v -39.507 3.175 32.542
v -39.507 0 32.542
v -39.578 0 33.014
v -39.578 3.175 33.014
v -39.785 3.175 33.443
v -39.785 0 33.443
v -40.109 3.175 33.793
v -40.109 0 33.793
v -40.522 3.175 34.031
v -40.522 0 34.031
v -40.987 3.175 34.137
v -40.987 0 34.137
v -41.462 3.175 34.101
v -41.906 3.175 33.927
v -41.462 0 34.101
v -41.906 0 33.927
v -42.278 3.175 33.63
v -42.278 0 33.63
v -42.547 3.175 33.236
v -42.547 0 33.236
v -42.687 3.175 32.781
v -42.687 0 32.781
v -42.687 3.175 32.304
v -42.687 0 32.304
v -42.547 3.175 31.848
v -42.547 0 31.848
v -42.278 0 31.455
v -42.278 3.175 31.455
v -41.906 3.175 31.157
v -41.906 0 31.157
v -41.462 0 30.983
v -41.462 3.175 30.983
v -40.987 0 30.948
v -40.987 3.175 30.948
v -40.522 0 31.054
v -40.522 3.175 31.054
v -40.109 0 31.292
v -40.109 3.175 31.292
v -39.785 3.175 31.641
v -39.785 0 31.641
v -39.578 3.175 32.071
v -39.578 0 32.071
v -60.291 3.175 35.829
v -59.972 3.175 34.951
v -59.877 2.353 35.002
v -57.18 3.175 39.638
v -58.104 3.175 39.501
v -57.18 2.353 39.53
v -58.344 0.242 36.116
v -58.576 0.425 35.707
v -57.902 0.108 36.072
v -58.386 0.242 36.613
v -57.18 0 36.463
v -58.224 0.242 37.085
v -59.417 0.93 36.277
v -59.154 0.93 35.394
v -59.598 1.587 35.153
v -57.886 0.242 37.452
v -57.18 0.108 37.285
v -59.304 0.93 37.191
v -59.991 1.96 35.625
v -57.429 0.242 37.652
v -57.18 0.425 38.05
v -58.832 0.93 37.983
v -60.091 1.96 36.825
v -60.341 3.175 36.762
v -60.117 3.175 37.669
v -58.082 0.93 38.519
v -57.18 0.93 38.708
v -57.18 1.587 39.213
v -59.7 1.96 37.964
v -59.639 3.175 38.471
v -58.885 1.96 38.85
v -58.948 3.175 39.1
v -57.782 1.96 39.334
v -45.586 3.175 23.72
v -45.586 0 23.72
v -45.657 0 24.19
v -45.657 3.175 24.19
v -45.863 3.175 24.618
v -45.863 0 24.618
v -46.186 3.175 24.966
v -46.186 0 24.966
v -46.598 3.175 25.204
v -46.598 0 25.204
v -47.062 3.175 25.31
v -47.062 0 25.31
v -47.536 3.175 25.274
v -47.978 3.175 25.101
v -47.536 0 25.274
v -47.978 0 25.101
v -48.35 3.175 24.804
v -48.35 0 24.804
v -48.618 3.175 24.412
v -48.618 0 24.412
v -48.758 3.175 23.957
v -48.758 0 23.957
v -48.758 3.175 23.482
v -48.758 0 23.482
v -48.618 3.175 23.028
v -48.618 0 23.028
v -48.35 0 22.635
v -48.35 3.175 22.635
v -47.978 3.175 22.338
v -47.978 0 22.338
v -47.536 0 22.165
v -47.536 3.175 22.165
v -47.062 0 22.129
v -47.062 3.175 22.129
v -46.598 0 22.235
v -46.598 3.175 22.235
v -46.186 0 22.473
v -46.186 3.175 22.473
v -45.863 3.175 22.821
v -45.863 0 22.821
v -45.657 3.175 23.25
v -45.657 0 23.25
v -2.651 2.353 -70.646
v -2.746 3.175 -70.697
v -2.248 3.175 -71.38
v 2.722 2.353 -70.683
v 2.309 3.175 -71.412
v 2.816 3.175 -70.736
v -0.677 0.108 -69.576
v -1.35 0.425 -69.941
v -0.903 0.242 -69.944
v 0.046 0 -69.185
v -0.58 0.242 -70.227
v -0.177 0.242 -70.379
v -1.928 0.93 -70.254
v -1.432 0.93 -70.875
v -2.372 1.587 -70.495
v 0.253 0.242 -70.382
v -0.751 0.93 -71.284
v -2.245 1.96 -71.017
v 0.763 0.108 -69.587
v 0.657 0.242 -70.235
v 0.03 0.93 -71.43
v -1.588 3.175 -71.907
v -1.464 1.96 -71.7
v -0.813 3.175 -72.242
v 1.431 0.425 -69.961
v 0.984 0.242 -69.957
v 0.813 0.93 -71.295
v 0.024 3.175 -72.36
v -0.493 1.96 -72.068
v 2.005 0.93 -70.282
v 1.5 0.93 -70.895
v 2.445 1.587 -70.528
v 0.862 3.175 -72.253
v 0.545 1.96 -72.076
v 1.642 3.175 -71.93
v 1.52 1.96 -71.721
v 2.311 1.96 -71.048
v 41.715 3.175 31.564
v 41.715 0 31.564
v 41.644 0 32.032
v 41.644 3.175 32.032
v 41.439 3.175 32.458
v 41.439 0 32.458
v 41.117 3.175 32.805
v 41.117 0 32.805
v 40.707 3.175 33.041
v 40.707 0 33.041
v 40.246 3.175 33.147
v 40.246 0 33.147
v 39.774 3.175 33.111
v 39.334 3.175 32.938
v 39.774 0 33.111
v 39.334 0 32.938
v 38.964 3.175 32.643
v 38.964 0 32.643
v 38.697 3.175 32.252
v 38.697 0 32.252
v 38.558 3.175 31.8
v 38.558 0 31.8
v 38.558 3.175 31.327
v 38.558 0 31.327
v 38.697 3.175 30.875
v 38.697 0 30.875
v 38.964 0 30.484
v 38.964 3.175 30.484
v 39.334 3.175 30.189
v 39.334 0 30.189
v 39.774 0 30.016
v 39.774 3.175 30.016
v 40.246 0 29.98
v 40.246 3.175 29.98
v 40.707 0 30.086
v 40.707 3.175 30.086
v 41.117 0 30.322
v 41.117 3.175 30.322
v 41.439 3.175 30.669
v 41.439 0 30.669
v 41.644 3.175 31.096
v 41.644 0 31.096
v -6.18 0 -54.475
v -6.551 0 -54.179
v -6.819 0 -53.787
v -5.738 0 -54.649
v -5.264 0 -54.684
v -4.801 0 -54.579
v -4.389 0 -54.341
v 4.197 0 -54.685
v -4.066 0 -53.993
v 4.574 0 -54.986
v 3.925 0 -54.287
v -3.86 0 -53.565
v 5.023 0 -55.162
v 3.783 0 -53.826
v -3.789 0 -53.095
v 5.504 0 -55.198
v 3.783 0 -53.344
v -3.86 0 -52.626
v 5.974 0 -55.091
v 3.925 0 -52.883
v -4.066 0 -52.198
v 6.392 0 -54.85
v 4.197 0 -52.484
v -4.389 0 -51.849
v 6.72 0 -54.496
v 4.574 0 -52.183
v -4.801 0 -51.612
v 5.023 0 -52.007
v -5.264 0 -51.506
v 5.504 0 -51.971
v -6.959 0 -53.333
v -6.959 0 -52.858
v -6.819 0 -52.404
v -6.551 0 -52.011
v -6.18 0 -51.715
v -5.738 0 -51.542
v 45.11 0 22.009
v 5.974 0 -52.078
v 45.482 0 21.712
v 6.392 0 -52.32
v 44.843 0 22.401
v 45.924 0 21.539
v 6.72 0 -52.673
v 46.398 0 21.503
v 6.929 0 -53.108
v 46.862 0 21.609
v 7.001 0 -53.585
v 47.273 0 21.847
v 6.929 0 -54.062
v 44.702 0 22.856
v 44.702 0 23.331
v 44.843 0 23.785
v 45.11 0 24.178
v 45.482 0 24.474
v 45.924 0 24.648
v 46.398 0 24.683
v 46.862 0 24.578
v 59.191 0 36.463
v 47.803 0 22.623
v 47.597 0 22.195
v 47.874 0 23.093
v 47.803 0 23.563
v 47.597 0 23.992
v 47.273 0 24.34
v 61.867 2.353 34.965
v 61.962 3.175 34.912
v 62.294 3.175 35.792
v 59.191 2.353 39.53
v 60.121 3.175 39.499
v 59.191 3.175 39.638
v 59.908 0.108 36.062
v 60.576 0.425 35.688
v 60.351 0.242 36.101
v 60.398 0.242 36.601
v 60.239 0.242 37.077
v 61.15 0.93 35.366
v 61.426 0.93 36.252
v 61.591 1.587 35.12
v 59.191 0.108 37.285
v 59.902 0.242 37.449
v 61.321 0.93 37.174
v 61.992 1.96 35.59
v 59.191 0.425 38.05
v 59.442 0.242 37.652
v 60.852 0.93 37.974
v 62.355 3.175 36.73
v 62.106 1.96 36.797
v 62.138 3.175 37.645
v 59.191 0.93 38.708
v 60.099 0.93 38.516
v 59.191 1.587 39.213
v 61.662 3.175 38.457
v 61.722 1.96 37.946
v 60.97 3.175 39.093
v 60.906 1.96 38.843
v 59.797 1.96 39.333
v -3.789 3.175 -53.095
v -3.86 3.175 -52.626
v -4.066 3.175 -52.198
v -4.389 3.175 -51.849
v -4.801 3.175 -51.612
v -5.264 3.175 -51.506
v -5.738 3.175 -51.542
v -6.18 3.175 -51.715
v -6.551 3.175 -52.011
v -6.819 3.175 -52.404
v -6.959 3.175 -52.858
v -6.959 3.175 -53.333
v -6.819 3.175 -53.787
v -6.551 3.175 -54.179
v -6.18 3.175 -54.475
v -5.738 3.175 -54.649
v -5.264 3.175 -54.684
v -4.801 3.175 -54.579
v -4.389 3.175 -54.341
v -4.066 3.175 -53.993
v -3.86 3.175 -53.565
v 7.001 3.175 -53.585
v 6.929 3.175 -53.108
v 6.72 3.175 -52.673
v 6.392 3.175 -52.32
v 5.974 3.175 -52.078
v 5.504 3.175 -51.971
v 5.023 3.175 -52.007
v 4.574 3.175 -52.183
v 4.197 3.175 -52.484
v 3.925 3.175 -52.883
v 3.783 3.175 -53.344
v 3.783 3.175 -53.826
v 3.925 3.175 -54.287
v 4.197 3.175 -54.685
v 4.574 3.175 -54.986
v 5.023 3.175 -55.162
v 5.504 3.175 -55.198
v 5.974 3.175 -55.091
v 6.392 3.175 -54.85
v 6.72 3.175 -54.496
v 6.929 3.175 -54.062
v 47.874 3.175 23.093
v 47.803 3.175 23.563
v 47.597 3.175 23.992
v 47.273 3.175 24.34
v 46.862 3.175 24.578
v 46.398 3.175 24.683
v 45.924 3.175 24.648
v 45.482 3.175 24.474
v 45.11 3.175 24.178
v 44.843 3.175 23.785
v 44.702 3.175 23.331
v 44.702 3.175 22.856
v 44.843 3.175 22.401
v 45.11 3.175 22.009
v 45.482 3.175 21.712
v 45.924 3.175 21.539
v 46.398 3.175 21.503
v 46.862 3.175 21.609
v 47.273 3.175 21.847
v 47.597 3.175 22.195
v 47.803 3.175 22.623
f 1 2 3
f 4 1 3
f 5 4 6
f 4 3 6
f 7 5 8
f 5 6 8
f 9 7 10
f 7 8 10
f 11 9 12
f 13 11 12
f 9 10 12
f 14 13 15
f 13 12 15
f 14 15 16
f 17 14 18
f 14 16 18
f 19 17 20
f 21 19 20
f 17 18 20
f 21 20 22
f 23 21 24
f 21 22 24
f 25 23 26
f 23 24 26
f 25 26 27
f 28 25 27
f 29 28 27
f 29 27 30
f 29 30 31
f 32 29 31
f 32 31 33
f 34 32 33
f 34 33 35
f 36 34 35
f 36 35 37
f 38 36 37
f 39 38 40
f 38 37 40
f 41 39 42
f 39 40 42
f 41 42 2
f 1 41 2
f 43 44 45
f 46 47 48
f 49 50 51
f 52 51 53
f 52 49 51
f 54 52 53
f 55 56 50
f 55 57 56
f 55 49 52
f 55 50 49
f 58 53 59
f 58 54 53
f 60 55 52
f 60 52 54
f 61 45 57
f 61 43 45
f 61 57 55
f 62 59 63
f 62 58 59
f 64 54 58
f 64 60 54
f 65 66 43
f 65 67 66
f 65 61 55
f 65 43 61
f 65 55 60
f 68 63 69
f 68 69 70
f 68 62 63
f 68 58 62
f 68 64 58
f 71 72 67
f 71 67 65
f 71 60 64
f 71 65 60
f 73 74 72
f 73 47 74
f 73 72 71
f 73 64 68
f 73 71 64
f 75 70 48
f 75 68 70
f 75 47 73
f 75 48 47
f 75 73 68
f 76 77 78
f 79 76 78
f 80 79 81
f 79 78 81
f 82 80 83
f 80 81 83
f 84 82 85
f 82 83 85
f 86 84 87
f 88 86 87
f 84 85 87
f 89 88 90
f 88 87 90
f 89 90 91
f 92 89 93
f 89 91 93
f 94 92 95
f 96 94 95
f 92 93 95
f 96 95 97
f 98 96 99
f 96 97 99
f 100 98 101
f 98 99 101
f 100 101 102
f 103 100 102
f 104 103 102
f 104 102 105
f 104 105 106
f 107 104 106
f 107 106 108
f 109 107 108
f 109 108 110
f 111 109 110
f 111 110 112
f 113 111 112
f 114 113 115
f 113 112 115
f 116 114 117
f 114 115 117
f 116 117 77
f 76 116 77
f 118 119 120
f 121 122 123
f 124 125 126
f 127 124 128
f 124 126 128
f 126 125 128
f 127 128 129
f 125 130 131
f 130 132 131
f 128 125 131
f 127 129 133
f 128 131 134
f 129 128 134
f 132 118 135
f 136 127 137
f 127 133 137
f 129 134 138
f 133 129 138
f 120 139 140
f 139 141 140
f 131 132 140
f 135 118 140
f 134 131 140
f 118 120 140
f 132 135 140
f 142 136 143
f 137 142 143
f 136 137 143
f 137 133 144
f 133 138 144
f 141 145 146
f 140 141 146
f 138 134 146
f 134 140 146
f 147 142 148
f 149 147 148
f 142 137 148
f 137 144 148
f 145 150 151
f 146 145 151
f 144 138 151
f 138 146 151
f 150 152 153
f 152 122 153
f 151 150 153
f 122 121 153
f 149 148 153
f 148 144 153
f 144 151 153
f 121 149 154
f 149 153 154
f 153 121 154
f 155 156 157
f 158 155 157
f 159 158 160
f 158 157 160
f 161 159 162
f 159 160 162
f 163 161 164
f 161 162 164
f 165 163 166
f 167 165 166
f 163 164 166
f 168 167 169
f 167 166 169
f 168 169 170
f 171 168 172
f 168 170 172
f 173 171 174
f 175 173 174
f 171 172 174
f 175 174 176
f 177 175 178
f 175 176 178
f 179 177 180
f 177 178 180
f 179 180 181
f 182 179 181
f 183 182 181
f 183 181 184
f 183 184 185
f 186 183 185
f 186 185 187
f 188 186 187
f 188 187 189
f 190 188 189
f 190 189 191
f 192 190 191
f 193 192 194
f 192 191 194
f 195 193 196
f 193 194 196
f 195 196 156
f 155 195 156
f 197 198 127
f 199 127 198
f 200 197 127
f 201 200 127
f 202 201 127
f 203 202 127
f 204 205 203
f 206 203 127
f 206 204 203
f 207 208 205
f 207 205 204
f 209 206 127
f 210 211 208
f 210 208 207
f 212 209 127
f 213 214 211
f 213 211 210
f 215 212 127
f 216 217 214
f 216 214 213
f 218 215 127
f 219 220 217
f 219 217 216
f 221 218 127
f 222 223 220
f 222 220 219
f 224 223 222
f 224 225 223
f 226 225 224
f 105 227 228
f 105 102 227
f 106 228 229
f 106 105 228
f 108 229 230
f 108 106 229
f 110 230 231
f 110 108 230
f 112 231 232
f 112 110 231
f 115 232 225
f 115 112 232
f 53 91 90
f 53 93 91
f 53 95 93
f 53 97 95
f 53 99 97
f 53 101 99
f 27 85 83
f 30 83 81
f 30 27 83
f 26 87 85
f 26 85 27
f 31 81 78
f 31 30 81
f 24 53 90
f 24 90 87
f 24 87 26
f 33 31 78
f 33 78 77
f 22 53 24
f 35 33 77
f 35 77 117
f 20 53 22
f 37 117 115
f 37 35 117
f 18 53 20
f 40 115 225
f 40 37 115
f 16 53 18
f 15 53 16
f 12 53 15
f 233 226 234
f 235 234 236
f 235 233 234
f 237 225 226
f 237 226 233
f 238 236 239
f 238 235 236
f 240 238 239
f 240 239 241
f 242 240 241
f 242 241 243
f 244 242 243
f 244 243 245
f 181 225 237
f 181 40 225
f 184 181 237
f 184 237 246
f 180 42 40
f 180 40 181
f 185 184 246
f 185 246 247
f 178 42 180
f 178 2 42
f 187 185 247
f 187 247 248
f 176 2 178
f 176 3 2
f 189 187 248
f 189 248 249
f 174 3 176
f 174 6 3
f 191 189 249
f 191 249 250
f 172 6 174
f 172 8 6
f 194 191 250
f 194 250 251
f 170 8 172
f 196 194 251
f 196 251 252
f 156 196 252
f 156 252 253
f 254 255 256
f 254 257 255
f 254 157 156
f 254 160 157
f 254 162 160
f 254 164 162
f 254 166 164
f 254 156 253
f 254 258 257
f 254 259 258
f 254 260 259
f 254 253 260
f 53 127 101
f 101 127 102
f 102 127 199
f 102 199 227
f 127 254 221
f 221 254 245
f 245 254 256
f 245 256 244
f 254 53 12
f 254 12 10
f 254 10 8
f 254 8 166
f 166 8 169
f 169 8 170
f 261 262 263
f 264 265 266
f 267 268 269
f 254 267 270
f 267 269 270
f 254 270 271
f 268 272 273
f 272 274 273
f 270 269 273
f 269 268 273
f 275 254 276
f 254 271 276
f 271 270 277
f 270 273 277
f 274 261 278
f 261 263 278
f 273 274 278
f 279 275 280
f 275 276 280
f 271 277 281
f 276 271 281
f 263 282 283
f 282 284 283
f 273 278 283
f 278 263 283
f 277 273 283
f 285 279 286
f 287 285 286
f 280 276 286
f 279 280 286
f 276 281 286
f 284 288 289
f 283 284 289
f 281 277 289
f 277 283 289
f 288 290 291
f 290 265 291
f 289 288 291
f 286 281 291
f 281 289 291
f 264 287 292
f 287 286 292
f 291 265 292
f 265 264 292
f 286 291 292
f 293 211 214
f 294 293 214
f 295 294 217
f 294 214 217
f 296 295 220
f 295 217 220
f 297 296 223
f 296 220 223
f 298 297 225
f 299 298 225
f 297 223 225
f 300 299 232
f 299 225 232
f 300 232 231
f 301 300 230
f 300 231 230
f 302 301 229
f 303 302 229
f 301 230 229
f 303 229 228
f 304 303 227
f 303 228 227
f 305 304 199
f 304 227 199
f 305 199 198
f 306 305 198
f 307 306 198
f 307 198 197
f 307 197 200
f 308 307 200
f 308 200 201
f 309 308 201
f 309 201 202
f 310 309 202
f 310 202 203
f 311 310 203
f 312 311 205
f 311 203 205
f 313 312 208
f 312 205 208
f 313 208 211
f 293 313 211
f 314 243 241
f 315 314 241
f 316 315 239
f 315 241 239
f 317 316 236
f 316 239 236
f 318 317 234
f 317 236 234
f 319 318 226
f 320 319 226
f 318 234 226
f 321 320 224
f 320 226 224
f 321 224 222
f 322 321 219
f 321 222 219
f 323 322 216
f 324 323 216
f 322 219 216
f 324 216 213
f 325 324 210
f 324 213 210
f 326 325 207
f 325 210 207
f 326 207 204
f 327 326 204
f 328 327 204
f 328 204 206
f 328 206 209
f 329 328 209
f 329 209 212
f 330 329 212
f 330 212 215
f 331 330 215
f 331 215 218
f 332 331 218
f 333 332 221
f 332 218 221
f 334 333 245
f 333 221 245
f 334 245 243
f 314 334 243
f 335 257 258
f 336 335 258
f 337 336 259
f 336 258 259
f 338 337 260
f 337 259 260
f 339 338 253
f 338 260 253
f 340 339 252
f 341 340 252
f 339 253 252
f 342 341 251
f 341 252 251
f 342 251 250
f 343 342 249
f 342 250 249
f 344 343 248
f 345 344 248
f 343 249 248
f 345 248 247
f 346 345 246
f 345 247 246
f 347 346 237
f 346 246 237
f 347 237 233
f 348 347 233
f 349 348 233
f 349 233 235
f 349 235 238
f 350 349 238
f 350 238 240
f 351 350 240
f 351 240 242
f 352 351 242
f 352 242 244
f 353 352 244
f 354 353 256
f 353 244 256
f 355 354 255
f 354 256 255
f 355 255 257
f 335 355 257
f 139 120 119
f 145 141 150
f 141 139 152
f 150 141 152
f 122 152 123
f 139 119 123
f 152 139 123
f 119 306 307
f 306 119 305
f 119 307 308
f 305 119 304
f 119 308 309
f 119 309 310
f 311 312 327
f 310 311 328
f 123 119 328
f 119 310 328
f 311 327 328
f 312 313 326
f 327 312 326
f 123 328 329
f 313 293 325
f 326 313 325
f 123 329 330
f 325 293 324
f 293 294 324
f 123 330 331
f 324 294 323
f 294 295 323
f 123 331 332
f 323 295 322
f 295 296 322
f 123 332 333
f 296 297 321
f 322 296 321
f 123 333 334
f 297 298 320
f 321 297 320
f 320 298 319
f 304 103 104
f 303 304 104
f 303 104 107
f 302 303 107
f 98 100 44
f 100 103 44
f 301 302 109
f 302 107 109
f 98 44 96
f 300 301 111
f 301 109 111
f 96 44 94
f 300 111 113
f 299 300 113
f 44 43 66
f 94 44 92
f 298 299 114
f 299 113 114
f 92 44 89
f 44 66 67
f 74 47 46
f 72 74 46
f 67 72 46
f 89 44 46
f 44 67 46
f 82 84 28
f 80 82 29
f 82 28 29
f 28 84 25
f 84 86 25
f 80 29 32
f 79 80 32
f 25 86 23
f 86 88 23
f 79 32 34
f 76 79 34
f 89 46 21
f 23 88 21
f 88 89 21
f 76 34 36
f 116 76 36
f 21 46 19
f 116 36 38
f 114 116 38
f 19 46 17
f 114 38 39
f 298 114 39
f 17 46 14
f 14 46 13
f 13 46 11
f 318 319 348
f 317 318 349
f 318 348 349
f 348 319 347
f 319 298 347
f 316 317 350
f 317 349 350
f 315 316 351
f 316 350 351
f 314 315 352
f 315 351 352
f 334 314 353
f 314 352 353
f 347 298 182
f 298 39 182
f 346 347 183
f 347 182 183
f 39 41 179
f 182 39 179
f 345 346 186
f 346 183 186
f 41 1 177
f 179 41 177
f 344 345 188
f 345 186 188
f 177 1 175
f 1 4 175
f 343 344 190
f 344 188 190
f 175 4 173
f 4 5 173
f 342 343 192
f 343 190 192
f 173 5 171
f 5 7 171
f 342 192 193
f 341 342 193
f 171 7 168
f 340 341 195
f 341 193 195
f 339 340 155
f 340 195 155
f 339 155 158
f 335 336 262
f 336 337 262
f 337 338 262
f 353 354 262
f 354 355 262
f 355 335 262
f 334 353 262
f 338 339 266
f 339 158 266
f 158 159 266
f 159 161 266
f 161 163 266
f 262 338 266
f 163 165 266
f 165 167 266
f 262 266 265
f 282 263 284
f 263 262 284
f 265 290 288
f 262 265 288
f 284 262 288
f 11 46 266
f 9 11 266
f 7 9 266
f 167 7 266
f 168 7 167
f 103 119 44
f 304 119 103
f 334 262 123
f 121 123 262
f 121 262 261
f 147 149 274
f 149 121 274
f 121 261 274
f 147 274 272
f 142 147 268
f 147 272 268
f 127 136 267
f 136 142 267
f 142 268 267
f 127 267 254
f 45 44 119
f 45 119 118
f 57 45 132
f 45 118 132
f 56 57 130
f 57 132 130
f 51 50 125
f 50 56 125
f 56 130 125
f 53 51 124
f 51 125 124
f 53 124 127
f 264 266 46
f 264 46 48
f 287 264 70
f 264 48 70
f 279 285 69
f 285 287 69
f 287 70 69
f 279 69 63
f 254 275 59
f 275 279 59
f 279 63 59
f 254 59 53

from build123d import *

# Parameters (mm, degrees)
F0_R     = 1.5934819676
F0_R_2   = 1.6180372771
F0_R_3   = 1.5947735427
F0_R_4   = 1.599183997
F0_R_5   = 1.5713503285
F0_R_6   = 1.584959903
F0_R_7   = 1.5945023752
F0_R_8   = 1.5875542678
F1_DEPTH = 3.175
F2_R     = 3.17499


# Not quite as in the source:
# - a fillet or chamfer is up to 0.001 mm smaller than in the source, because OpenCascade refuses the exact size


with BuildPart() as f1:
    # F0 (on Front) → F1 (new body)
    with BuildSketch(Plane.XZ):
        Polygon((64.607411623, 39.6379828453), (-62.5105649233, 39.6379828453), (0, -75.7666006684), align=None)
        with Locations((-5.3829359822, -53.0953221023)):
            Circle(F0_R, mode=Mode.SUBTRACT)
        with Locations((5.3829369135, -53.5846799612)):
            Circle(F0_R_2, mode=Mode.SUBTRACT)
        with Locations((-47.1807047725, 23.7195882946)):
            Circle(F0_R_3, mode=Mode.SUBTRACT)
        with Locations((-41.106056422, 32.5422920287)):
            Circle(F0_R_4, mode=Mode.SUBTRACT)
        with Locations((-6.8510090932, 33.5210077465)):
            Circle(F0_R_5, mode=Mode.SUBTRACT)
        with Locations((7.829724811, 33.5210077465)):
            Circle(F0_R_6, mode=Mode.SUBTRACT)
        with Locations((46.2791621685, 23.0933185667)):
            Circle(F0_R_7, mode=Mode.SUBTRACT)
        with Locations((40.1273407042, 31.5635800362)):
            Circle(F0_R_8, mode=Mode.SUBTRACT)
        with Locations((7.829724811, 33.5210077465)):
            Circle(F0_R_6)
        with Locations((-6.8510090932, 33.5210077465)):
            Circle(F0_R_5)
    extrude(amount=-F1_DEPTH)

    # F2 (radius 3.175 in the source; OpenCascade refuses exactly that, so slightly less here)
    f2_edges = [f1.edges().sort_by_distance(p)[0] for p in [
        (64.607412, 1.5875, 39.637983),
        (-62.510565, 1.5875, 39.637983),
        (0, 1.5875, -75.766601),
        (-31.255282, 0, -18.064309),
        (32.303706, 0, -18.064309),
        (1.048423, 0, 39.637983),
    ]]
    fillet(f2_edges, radius=F2_R)


solid = f1.part
